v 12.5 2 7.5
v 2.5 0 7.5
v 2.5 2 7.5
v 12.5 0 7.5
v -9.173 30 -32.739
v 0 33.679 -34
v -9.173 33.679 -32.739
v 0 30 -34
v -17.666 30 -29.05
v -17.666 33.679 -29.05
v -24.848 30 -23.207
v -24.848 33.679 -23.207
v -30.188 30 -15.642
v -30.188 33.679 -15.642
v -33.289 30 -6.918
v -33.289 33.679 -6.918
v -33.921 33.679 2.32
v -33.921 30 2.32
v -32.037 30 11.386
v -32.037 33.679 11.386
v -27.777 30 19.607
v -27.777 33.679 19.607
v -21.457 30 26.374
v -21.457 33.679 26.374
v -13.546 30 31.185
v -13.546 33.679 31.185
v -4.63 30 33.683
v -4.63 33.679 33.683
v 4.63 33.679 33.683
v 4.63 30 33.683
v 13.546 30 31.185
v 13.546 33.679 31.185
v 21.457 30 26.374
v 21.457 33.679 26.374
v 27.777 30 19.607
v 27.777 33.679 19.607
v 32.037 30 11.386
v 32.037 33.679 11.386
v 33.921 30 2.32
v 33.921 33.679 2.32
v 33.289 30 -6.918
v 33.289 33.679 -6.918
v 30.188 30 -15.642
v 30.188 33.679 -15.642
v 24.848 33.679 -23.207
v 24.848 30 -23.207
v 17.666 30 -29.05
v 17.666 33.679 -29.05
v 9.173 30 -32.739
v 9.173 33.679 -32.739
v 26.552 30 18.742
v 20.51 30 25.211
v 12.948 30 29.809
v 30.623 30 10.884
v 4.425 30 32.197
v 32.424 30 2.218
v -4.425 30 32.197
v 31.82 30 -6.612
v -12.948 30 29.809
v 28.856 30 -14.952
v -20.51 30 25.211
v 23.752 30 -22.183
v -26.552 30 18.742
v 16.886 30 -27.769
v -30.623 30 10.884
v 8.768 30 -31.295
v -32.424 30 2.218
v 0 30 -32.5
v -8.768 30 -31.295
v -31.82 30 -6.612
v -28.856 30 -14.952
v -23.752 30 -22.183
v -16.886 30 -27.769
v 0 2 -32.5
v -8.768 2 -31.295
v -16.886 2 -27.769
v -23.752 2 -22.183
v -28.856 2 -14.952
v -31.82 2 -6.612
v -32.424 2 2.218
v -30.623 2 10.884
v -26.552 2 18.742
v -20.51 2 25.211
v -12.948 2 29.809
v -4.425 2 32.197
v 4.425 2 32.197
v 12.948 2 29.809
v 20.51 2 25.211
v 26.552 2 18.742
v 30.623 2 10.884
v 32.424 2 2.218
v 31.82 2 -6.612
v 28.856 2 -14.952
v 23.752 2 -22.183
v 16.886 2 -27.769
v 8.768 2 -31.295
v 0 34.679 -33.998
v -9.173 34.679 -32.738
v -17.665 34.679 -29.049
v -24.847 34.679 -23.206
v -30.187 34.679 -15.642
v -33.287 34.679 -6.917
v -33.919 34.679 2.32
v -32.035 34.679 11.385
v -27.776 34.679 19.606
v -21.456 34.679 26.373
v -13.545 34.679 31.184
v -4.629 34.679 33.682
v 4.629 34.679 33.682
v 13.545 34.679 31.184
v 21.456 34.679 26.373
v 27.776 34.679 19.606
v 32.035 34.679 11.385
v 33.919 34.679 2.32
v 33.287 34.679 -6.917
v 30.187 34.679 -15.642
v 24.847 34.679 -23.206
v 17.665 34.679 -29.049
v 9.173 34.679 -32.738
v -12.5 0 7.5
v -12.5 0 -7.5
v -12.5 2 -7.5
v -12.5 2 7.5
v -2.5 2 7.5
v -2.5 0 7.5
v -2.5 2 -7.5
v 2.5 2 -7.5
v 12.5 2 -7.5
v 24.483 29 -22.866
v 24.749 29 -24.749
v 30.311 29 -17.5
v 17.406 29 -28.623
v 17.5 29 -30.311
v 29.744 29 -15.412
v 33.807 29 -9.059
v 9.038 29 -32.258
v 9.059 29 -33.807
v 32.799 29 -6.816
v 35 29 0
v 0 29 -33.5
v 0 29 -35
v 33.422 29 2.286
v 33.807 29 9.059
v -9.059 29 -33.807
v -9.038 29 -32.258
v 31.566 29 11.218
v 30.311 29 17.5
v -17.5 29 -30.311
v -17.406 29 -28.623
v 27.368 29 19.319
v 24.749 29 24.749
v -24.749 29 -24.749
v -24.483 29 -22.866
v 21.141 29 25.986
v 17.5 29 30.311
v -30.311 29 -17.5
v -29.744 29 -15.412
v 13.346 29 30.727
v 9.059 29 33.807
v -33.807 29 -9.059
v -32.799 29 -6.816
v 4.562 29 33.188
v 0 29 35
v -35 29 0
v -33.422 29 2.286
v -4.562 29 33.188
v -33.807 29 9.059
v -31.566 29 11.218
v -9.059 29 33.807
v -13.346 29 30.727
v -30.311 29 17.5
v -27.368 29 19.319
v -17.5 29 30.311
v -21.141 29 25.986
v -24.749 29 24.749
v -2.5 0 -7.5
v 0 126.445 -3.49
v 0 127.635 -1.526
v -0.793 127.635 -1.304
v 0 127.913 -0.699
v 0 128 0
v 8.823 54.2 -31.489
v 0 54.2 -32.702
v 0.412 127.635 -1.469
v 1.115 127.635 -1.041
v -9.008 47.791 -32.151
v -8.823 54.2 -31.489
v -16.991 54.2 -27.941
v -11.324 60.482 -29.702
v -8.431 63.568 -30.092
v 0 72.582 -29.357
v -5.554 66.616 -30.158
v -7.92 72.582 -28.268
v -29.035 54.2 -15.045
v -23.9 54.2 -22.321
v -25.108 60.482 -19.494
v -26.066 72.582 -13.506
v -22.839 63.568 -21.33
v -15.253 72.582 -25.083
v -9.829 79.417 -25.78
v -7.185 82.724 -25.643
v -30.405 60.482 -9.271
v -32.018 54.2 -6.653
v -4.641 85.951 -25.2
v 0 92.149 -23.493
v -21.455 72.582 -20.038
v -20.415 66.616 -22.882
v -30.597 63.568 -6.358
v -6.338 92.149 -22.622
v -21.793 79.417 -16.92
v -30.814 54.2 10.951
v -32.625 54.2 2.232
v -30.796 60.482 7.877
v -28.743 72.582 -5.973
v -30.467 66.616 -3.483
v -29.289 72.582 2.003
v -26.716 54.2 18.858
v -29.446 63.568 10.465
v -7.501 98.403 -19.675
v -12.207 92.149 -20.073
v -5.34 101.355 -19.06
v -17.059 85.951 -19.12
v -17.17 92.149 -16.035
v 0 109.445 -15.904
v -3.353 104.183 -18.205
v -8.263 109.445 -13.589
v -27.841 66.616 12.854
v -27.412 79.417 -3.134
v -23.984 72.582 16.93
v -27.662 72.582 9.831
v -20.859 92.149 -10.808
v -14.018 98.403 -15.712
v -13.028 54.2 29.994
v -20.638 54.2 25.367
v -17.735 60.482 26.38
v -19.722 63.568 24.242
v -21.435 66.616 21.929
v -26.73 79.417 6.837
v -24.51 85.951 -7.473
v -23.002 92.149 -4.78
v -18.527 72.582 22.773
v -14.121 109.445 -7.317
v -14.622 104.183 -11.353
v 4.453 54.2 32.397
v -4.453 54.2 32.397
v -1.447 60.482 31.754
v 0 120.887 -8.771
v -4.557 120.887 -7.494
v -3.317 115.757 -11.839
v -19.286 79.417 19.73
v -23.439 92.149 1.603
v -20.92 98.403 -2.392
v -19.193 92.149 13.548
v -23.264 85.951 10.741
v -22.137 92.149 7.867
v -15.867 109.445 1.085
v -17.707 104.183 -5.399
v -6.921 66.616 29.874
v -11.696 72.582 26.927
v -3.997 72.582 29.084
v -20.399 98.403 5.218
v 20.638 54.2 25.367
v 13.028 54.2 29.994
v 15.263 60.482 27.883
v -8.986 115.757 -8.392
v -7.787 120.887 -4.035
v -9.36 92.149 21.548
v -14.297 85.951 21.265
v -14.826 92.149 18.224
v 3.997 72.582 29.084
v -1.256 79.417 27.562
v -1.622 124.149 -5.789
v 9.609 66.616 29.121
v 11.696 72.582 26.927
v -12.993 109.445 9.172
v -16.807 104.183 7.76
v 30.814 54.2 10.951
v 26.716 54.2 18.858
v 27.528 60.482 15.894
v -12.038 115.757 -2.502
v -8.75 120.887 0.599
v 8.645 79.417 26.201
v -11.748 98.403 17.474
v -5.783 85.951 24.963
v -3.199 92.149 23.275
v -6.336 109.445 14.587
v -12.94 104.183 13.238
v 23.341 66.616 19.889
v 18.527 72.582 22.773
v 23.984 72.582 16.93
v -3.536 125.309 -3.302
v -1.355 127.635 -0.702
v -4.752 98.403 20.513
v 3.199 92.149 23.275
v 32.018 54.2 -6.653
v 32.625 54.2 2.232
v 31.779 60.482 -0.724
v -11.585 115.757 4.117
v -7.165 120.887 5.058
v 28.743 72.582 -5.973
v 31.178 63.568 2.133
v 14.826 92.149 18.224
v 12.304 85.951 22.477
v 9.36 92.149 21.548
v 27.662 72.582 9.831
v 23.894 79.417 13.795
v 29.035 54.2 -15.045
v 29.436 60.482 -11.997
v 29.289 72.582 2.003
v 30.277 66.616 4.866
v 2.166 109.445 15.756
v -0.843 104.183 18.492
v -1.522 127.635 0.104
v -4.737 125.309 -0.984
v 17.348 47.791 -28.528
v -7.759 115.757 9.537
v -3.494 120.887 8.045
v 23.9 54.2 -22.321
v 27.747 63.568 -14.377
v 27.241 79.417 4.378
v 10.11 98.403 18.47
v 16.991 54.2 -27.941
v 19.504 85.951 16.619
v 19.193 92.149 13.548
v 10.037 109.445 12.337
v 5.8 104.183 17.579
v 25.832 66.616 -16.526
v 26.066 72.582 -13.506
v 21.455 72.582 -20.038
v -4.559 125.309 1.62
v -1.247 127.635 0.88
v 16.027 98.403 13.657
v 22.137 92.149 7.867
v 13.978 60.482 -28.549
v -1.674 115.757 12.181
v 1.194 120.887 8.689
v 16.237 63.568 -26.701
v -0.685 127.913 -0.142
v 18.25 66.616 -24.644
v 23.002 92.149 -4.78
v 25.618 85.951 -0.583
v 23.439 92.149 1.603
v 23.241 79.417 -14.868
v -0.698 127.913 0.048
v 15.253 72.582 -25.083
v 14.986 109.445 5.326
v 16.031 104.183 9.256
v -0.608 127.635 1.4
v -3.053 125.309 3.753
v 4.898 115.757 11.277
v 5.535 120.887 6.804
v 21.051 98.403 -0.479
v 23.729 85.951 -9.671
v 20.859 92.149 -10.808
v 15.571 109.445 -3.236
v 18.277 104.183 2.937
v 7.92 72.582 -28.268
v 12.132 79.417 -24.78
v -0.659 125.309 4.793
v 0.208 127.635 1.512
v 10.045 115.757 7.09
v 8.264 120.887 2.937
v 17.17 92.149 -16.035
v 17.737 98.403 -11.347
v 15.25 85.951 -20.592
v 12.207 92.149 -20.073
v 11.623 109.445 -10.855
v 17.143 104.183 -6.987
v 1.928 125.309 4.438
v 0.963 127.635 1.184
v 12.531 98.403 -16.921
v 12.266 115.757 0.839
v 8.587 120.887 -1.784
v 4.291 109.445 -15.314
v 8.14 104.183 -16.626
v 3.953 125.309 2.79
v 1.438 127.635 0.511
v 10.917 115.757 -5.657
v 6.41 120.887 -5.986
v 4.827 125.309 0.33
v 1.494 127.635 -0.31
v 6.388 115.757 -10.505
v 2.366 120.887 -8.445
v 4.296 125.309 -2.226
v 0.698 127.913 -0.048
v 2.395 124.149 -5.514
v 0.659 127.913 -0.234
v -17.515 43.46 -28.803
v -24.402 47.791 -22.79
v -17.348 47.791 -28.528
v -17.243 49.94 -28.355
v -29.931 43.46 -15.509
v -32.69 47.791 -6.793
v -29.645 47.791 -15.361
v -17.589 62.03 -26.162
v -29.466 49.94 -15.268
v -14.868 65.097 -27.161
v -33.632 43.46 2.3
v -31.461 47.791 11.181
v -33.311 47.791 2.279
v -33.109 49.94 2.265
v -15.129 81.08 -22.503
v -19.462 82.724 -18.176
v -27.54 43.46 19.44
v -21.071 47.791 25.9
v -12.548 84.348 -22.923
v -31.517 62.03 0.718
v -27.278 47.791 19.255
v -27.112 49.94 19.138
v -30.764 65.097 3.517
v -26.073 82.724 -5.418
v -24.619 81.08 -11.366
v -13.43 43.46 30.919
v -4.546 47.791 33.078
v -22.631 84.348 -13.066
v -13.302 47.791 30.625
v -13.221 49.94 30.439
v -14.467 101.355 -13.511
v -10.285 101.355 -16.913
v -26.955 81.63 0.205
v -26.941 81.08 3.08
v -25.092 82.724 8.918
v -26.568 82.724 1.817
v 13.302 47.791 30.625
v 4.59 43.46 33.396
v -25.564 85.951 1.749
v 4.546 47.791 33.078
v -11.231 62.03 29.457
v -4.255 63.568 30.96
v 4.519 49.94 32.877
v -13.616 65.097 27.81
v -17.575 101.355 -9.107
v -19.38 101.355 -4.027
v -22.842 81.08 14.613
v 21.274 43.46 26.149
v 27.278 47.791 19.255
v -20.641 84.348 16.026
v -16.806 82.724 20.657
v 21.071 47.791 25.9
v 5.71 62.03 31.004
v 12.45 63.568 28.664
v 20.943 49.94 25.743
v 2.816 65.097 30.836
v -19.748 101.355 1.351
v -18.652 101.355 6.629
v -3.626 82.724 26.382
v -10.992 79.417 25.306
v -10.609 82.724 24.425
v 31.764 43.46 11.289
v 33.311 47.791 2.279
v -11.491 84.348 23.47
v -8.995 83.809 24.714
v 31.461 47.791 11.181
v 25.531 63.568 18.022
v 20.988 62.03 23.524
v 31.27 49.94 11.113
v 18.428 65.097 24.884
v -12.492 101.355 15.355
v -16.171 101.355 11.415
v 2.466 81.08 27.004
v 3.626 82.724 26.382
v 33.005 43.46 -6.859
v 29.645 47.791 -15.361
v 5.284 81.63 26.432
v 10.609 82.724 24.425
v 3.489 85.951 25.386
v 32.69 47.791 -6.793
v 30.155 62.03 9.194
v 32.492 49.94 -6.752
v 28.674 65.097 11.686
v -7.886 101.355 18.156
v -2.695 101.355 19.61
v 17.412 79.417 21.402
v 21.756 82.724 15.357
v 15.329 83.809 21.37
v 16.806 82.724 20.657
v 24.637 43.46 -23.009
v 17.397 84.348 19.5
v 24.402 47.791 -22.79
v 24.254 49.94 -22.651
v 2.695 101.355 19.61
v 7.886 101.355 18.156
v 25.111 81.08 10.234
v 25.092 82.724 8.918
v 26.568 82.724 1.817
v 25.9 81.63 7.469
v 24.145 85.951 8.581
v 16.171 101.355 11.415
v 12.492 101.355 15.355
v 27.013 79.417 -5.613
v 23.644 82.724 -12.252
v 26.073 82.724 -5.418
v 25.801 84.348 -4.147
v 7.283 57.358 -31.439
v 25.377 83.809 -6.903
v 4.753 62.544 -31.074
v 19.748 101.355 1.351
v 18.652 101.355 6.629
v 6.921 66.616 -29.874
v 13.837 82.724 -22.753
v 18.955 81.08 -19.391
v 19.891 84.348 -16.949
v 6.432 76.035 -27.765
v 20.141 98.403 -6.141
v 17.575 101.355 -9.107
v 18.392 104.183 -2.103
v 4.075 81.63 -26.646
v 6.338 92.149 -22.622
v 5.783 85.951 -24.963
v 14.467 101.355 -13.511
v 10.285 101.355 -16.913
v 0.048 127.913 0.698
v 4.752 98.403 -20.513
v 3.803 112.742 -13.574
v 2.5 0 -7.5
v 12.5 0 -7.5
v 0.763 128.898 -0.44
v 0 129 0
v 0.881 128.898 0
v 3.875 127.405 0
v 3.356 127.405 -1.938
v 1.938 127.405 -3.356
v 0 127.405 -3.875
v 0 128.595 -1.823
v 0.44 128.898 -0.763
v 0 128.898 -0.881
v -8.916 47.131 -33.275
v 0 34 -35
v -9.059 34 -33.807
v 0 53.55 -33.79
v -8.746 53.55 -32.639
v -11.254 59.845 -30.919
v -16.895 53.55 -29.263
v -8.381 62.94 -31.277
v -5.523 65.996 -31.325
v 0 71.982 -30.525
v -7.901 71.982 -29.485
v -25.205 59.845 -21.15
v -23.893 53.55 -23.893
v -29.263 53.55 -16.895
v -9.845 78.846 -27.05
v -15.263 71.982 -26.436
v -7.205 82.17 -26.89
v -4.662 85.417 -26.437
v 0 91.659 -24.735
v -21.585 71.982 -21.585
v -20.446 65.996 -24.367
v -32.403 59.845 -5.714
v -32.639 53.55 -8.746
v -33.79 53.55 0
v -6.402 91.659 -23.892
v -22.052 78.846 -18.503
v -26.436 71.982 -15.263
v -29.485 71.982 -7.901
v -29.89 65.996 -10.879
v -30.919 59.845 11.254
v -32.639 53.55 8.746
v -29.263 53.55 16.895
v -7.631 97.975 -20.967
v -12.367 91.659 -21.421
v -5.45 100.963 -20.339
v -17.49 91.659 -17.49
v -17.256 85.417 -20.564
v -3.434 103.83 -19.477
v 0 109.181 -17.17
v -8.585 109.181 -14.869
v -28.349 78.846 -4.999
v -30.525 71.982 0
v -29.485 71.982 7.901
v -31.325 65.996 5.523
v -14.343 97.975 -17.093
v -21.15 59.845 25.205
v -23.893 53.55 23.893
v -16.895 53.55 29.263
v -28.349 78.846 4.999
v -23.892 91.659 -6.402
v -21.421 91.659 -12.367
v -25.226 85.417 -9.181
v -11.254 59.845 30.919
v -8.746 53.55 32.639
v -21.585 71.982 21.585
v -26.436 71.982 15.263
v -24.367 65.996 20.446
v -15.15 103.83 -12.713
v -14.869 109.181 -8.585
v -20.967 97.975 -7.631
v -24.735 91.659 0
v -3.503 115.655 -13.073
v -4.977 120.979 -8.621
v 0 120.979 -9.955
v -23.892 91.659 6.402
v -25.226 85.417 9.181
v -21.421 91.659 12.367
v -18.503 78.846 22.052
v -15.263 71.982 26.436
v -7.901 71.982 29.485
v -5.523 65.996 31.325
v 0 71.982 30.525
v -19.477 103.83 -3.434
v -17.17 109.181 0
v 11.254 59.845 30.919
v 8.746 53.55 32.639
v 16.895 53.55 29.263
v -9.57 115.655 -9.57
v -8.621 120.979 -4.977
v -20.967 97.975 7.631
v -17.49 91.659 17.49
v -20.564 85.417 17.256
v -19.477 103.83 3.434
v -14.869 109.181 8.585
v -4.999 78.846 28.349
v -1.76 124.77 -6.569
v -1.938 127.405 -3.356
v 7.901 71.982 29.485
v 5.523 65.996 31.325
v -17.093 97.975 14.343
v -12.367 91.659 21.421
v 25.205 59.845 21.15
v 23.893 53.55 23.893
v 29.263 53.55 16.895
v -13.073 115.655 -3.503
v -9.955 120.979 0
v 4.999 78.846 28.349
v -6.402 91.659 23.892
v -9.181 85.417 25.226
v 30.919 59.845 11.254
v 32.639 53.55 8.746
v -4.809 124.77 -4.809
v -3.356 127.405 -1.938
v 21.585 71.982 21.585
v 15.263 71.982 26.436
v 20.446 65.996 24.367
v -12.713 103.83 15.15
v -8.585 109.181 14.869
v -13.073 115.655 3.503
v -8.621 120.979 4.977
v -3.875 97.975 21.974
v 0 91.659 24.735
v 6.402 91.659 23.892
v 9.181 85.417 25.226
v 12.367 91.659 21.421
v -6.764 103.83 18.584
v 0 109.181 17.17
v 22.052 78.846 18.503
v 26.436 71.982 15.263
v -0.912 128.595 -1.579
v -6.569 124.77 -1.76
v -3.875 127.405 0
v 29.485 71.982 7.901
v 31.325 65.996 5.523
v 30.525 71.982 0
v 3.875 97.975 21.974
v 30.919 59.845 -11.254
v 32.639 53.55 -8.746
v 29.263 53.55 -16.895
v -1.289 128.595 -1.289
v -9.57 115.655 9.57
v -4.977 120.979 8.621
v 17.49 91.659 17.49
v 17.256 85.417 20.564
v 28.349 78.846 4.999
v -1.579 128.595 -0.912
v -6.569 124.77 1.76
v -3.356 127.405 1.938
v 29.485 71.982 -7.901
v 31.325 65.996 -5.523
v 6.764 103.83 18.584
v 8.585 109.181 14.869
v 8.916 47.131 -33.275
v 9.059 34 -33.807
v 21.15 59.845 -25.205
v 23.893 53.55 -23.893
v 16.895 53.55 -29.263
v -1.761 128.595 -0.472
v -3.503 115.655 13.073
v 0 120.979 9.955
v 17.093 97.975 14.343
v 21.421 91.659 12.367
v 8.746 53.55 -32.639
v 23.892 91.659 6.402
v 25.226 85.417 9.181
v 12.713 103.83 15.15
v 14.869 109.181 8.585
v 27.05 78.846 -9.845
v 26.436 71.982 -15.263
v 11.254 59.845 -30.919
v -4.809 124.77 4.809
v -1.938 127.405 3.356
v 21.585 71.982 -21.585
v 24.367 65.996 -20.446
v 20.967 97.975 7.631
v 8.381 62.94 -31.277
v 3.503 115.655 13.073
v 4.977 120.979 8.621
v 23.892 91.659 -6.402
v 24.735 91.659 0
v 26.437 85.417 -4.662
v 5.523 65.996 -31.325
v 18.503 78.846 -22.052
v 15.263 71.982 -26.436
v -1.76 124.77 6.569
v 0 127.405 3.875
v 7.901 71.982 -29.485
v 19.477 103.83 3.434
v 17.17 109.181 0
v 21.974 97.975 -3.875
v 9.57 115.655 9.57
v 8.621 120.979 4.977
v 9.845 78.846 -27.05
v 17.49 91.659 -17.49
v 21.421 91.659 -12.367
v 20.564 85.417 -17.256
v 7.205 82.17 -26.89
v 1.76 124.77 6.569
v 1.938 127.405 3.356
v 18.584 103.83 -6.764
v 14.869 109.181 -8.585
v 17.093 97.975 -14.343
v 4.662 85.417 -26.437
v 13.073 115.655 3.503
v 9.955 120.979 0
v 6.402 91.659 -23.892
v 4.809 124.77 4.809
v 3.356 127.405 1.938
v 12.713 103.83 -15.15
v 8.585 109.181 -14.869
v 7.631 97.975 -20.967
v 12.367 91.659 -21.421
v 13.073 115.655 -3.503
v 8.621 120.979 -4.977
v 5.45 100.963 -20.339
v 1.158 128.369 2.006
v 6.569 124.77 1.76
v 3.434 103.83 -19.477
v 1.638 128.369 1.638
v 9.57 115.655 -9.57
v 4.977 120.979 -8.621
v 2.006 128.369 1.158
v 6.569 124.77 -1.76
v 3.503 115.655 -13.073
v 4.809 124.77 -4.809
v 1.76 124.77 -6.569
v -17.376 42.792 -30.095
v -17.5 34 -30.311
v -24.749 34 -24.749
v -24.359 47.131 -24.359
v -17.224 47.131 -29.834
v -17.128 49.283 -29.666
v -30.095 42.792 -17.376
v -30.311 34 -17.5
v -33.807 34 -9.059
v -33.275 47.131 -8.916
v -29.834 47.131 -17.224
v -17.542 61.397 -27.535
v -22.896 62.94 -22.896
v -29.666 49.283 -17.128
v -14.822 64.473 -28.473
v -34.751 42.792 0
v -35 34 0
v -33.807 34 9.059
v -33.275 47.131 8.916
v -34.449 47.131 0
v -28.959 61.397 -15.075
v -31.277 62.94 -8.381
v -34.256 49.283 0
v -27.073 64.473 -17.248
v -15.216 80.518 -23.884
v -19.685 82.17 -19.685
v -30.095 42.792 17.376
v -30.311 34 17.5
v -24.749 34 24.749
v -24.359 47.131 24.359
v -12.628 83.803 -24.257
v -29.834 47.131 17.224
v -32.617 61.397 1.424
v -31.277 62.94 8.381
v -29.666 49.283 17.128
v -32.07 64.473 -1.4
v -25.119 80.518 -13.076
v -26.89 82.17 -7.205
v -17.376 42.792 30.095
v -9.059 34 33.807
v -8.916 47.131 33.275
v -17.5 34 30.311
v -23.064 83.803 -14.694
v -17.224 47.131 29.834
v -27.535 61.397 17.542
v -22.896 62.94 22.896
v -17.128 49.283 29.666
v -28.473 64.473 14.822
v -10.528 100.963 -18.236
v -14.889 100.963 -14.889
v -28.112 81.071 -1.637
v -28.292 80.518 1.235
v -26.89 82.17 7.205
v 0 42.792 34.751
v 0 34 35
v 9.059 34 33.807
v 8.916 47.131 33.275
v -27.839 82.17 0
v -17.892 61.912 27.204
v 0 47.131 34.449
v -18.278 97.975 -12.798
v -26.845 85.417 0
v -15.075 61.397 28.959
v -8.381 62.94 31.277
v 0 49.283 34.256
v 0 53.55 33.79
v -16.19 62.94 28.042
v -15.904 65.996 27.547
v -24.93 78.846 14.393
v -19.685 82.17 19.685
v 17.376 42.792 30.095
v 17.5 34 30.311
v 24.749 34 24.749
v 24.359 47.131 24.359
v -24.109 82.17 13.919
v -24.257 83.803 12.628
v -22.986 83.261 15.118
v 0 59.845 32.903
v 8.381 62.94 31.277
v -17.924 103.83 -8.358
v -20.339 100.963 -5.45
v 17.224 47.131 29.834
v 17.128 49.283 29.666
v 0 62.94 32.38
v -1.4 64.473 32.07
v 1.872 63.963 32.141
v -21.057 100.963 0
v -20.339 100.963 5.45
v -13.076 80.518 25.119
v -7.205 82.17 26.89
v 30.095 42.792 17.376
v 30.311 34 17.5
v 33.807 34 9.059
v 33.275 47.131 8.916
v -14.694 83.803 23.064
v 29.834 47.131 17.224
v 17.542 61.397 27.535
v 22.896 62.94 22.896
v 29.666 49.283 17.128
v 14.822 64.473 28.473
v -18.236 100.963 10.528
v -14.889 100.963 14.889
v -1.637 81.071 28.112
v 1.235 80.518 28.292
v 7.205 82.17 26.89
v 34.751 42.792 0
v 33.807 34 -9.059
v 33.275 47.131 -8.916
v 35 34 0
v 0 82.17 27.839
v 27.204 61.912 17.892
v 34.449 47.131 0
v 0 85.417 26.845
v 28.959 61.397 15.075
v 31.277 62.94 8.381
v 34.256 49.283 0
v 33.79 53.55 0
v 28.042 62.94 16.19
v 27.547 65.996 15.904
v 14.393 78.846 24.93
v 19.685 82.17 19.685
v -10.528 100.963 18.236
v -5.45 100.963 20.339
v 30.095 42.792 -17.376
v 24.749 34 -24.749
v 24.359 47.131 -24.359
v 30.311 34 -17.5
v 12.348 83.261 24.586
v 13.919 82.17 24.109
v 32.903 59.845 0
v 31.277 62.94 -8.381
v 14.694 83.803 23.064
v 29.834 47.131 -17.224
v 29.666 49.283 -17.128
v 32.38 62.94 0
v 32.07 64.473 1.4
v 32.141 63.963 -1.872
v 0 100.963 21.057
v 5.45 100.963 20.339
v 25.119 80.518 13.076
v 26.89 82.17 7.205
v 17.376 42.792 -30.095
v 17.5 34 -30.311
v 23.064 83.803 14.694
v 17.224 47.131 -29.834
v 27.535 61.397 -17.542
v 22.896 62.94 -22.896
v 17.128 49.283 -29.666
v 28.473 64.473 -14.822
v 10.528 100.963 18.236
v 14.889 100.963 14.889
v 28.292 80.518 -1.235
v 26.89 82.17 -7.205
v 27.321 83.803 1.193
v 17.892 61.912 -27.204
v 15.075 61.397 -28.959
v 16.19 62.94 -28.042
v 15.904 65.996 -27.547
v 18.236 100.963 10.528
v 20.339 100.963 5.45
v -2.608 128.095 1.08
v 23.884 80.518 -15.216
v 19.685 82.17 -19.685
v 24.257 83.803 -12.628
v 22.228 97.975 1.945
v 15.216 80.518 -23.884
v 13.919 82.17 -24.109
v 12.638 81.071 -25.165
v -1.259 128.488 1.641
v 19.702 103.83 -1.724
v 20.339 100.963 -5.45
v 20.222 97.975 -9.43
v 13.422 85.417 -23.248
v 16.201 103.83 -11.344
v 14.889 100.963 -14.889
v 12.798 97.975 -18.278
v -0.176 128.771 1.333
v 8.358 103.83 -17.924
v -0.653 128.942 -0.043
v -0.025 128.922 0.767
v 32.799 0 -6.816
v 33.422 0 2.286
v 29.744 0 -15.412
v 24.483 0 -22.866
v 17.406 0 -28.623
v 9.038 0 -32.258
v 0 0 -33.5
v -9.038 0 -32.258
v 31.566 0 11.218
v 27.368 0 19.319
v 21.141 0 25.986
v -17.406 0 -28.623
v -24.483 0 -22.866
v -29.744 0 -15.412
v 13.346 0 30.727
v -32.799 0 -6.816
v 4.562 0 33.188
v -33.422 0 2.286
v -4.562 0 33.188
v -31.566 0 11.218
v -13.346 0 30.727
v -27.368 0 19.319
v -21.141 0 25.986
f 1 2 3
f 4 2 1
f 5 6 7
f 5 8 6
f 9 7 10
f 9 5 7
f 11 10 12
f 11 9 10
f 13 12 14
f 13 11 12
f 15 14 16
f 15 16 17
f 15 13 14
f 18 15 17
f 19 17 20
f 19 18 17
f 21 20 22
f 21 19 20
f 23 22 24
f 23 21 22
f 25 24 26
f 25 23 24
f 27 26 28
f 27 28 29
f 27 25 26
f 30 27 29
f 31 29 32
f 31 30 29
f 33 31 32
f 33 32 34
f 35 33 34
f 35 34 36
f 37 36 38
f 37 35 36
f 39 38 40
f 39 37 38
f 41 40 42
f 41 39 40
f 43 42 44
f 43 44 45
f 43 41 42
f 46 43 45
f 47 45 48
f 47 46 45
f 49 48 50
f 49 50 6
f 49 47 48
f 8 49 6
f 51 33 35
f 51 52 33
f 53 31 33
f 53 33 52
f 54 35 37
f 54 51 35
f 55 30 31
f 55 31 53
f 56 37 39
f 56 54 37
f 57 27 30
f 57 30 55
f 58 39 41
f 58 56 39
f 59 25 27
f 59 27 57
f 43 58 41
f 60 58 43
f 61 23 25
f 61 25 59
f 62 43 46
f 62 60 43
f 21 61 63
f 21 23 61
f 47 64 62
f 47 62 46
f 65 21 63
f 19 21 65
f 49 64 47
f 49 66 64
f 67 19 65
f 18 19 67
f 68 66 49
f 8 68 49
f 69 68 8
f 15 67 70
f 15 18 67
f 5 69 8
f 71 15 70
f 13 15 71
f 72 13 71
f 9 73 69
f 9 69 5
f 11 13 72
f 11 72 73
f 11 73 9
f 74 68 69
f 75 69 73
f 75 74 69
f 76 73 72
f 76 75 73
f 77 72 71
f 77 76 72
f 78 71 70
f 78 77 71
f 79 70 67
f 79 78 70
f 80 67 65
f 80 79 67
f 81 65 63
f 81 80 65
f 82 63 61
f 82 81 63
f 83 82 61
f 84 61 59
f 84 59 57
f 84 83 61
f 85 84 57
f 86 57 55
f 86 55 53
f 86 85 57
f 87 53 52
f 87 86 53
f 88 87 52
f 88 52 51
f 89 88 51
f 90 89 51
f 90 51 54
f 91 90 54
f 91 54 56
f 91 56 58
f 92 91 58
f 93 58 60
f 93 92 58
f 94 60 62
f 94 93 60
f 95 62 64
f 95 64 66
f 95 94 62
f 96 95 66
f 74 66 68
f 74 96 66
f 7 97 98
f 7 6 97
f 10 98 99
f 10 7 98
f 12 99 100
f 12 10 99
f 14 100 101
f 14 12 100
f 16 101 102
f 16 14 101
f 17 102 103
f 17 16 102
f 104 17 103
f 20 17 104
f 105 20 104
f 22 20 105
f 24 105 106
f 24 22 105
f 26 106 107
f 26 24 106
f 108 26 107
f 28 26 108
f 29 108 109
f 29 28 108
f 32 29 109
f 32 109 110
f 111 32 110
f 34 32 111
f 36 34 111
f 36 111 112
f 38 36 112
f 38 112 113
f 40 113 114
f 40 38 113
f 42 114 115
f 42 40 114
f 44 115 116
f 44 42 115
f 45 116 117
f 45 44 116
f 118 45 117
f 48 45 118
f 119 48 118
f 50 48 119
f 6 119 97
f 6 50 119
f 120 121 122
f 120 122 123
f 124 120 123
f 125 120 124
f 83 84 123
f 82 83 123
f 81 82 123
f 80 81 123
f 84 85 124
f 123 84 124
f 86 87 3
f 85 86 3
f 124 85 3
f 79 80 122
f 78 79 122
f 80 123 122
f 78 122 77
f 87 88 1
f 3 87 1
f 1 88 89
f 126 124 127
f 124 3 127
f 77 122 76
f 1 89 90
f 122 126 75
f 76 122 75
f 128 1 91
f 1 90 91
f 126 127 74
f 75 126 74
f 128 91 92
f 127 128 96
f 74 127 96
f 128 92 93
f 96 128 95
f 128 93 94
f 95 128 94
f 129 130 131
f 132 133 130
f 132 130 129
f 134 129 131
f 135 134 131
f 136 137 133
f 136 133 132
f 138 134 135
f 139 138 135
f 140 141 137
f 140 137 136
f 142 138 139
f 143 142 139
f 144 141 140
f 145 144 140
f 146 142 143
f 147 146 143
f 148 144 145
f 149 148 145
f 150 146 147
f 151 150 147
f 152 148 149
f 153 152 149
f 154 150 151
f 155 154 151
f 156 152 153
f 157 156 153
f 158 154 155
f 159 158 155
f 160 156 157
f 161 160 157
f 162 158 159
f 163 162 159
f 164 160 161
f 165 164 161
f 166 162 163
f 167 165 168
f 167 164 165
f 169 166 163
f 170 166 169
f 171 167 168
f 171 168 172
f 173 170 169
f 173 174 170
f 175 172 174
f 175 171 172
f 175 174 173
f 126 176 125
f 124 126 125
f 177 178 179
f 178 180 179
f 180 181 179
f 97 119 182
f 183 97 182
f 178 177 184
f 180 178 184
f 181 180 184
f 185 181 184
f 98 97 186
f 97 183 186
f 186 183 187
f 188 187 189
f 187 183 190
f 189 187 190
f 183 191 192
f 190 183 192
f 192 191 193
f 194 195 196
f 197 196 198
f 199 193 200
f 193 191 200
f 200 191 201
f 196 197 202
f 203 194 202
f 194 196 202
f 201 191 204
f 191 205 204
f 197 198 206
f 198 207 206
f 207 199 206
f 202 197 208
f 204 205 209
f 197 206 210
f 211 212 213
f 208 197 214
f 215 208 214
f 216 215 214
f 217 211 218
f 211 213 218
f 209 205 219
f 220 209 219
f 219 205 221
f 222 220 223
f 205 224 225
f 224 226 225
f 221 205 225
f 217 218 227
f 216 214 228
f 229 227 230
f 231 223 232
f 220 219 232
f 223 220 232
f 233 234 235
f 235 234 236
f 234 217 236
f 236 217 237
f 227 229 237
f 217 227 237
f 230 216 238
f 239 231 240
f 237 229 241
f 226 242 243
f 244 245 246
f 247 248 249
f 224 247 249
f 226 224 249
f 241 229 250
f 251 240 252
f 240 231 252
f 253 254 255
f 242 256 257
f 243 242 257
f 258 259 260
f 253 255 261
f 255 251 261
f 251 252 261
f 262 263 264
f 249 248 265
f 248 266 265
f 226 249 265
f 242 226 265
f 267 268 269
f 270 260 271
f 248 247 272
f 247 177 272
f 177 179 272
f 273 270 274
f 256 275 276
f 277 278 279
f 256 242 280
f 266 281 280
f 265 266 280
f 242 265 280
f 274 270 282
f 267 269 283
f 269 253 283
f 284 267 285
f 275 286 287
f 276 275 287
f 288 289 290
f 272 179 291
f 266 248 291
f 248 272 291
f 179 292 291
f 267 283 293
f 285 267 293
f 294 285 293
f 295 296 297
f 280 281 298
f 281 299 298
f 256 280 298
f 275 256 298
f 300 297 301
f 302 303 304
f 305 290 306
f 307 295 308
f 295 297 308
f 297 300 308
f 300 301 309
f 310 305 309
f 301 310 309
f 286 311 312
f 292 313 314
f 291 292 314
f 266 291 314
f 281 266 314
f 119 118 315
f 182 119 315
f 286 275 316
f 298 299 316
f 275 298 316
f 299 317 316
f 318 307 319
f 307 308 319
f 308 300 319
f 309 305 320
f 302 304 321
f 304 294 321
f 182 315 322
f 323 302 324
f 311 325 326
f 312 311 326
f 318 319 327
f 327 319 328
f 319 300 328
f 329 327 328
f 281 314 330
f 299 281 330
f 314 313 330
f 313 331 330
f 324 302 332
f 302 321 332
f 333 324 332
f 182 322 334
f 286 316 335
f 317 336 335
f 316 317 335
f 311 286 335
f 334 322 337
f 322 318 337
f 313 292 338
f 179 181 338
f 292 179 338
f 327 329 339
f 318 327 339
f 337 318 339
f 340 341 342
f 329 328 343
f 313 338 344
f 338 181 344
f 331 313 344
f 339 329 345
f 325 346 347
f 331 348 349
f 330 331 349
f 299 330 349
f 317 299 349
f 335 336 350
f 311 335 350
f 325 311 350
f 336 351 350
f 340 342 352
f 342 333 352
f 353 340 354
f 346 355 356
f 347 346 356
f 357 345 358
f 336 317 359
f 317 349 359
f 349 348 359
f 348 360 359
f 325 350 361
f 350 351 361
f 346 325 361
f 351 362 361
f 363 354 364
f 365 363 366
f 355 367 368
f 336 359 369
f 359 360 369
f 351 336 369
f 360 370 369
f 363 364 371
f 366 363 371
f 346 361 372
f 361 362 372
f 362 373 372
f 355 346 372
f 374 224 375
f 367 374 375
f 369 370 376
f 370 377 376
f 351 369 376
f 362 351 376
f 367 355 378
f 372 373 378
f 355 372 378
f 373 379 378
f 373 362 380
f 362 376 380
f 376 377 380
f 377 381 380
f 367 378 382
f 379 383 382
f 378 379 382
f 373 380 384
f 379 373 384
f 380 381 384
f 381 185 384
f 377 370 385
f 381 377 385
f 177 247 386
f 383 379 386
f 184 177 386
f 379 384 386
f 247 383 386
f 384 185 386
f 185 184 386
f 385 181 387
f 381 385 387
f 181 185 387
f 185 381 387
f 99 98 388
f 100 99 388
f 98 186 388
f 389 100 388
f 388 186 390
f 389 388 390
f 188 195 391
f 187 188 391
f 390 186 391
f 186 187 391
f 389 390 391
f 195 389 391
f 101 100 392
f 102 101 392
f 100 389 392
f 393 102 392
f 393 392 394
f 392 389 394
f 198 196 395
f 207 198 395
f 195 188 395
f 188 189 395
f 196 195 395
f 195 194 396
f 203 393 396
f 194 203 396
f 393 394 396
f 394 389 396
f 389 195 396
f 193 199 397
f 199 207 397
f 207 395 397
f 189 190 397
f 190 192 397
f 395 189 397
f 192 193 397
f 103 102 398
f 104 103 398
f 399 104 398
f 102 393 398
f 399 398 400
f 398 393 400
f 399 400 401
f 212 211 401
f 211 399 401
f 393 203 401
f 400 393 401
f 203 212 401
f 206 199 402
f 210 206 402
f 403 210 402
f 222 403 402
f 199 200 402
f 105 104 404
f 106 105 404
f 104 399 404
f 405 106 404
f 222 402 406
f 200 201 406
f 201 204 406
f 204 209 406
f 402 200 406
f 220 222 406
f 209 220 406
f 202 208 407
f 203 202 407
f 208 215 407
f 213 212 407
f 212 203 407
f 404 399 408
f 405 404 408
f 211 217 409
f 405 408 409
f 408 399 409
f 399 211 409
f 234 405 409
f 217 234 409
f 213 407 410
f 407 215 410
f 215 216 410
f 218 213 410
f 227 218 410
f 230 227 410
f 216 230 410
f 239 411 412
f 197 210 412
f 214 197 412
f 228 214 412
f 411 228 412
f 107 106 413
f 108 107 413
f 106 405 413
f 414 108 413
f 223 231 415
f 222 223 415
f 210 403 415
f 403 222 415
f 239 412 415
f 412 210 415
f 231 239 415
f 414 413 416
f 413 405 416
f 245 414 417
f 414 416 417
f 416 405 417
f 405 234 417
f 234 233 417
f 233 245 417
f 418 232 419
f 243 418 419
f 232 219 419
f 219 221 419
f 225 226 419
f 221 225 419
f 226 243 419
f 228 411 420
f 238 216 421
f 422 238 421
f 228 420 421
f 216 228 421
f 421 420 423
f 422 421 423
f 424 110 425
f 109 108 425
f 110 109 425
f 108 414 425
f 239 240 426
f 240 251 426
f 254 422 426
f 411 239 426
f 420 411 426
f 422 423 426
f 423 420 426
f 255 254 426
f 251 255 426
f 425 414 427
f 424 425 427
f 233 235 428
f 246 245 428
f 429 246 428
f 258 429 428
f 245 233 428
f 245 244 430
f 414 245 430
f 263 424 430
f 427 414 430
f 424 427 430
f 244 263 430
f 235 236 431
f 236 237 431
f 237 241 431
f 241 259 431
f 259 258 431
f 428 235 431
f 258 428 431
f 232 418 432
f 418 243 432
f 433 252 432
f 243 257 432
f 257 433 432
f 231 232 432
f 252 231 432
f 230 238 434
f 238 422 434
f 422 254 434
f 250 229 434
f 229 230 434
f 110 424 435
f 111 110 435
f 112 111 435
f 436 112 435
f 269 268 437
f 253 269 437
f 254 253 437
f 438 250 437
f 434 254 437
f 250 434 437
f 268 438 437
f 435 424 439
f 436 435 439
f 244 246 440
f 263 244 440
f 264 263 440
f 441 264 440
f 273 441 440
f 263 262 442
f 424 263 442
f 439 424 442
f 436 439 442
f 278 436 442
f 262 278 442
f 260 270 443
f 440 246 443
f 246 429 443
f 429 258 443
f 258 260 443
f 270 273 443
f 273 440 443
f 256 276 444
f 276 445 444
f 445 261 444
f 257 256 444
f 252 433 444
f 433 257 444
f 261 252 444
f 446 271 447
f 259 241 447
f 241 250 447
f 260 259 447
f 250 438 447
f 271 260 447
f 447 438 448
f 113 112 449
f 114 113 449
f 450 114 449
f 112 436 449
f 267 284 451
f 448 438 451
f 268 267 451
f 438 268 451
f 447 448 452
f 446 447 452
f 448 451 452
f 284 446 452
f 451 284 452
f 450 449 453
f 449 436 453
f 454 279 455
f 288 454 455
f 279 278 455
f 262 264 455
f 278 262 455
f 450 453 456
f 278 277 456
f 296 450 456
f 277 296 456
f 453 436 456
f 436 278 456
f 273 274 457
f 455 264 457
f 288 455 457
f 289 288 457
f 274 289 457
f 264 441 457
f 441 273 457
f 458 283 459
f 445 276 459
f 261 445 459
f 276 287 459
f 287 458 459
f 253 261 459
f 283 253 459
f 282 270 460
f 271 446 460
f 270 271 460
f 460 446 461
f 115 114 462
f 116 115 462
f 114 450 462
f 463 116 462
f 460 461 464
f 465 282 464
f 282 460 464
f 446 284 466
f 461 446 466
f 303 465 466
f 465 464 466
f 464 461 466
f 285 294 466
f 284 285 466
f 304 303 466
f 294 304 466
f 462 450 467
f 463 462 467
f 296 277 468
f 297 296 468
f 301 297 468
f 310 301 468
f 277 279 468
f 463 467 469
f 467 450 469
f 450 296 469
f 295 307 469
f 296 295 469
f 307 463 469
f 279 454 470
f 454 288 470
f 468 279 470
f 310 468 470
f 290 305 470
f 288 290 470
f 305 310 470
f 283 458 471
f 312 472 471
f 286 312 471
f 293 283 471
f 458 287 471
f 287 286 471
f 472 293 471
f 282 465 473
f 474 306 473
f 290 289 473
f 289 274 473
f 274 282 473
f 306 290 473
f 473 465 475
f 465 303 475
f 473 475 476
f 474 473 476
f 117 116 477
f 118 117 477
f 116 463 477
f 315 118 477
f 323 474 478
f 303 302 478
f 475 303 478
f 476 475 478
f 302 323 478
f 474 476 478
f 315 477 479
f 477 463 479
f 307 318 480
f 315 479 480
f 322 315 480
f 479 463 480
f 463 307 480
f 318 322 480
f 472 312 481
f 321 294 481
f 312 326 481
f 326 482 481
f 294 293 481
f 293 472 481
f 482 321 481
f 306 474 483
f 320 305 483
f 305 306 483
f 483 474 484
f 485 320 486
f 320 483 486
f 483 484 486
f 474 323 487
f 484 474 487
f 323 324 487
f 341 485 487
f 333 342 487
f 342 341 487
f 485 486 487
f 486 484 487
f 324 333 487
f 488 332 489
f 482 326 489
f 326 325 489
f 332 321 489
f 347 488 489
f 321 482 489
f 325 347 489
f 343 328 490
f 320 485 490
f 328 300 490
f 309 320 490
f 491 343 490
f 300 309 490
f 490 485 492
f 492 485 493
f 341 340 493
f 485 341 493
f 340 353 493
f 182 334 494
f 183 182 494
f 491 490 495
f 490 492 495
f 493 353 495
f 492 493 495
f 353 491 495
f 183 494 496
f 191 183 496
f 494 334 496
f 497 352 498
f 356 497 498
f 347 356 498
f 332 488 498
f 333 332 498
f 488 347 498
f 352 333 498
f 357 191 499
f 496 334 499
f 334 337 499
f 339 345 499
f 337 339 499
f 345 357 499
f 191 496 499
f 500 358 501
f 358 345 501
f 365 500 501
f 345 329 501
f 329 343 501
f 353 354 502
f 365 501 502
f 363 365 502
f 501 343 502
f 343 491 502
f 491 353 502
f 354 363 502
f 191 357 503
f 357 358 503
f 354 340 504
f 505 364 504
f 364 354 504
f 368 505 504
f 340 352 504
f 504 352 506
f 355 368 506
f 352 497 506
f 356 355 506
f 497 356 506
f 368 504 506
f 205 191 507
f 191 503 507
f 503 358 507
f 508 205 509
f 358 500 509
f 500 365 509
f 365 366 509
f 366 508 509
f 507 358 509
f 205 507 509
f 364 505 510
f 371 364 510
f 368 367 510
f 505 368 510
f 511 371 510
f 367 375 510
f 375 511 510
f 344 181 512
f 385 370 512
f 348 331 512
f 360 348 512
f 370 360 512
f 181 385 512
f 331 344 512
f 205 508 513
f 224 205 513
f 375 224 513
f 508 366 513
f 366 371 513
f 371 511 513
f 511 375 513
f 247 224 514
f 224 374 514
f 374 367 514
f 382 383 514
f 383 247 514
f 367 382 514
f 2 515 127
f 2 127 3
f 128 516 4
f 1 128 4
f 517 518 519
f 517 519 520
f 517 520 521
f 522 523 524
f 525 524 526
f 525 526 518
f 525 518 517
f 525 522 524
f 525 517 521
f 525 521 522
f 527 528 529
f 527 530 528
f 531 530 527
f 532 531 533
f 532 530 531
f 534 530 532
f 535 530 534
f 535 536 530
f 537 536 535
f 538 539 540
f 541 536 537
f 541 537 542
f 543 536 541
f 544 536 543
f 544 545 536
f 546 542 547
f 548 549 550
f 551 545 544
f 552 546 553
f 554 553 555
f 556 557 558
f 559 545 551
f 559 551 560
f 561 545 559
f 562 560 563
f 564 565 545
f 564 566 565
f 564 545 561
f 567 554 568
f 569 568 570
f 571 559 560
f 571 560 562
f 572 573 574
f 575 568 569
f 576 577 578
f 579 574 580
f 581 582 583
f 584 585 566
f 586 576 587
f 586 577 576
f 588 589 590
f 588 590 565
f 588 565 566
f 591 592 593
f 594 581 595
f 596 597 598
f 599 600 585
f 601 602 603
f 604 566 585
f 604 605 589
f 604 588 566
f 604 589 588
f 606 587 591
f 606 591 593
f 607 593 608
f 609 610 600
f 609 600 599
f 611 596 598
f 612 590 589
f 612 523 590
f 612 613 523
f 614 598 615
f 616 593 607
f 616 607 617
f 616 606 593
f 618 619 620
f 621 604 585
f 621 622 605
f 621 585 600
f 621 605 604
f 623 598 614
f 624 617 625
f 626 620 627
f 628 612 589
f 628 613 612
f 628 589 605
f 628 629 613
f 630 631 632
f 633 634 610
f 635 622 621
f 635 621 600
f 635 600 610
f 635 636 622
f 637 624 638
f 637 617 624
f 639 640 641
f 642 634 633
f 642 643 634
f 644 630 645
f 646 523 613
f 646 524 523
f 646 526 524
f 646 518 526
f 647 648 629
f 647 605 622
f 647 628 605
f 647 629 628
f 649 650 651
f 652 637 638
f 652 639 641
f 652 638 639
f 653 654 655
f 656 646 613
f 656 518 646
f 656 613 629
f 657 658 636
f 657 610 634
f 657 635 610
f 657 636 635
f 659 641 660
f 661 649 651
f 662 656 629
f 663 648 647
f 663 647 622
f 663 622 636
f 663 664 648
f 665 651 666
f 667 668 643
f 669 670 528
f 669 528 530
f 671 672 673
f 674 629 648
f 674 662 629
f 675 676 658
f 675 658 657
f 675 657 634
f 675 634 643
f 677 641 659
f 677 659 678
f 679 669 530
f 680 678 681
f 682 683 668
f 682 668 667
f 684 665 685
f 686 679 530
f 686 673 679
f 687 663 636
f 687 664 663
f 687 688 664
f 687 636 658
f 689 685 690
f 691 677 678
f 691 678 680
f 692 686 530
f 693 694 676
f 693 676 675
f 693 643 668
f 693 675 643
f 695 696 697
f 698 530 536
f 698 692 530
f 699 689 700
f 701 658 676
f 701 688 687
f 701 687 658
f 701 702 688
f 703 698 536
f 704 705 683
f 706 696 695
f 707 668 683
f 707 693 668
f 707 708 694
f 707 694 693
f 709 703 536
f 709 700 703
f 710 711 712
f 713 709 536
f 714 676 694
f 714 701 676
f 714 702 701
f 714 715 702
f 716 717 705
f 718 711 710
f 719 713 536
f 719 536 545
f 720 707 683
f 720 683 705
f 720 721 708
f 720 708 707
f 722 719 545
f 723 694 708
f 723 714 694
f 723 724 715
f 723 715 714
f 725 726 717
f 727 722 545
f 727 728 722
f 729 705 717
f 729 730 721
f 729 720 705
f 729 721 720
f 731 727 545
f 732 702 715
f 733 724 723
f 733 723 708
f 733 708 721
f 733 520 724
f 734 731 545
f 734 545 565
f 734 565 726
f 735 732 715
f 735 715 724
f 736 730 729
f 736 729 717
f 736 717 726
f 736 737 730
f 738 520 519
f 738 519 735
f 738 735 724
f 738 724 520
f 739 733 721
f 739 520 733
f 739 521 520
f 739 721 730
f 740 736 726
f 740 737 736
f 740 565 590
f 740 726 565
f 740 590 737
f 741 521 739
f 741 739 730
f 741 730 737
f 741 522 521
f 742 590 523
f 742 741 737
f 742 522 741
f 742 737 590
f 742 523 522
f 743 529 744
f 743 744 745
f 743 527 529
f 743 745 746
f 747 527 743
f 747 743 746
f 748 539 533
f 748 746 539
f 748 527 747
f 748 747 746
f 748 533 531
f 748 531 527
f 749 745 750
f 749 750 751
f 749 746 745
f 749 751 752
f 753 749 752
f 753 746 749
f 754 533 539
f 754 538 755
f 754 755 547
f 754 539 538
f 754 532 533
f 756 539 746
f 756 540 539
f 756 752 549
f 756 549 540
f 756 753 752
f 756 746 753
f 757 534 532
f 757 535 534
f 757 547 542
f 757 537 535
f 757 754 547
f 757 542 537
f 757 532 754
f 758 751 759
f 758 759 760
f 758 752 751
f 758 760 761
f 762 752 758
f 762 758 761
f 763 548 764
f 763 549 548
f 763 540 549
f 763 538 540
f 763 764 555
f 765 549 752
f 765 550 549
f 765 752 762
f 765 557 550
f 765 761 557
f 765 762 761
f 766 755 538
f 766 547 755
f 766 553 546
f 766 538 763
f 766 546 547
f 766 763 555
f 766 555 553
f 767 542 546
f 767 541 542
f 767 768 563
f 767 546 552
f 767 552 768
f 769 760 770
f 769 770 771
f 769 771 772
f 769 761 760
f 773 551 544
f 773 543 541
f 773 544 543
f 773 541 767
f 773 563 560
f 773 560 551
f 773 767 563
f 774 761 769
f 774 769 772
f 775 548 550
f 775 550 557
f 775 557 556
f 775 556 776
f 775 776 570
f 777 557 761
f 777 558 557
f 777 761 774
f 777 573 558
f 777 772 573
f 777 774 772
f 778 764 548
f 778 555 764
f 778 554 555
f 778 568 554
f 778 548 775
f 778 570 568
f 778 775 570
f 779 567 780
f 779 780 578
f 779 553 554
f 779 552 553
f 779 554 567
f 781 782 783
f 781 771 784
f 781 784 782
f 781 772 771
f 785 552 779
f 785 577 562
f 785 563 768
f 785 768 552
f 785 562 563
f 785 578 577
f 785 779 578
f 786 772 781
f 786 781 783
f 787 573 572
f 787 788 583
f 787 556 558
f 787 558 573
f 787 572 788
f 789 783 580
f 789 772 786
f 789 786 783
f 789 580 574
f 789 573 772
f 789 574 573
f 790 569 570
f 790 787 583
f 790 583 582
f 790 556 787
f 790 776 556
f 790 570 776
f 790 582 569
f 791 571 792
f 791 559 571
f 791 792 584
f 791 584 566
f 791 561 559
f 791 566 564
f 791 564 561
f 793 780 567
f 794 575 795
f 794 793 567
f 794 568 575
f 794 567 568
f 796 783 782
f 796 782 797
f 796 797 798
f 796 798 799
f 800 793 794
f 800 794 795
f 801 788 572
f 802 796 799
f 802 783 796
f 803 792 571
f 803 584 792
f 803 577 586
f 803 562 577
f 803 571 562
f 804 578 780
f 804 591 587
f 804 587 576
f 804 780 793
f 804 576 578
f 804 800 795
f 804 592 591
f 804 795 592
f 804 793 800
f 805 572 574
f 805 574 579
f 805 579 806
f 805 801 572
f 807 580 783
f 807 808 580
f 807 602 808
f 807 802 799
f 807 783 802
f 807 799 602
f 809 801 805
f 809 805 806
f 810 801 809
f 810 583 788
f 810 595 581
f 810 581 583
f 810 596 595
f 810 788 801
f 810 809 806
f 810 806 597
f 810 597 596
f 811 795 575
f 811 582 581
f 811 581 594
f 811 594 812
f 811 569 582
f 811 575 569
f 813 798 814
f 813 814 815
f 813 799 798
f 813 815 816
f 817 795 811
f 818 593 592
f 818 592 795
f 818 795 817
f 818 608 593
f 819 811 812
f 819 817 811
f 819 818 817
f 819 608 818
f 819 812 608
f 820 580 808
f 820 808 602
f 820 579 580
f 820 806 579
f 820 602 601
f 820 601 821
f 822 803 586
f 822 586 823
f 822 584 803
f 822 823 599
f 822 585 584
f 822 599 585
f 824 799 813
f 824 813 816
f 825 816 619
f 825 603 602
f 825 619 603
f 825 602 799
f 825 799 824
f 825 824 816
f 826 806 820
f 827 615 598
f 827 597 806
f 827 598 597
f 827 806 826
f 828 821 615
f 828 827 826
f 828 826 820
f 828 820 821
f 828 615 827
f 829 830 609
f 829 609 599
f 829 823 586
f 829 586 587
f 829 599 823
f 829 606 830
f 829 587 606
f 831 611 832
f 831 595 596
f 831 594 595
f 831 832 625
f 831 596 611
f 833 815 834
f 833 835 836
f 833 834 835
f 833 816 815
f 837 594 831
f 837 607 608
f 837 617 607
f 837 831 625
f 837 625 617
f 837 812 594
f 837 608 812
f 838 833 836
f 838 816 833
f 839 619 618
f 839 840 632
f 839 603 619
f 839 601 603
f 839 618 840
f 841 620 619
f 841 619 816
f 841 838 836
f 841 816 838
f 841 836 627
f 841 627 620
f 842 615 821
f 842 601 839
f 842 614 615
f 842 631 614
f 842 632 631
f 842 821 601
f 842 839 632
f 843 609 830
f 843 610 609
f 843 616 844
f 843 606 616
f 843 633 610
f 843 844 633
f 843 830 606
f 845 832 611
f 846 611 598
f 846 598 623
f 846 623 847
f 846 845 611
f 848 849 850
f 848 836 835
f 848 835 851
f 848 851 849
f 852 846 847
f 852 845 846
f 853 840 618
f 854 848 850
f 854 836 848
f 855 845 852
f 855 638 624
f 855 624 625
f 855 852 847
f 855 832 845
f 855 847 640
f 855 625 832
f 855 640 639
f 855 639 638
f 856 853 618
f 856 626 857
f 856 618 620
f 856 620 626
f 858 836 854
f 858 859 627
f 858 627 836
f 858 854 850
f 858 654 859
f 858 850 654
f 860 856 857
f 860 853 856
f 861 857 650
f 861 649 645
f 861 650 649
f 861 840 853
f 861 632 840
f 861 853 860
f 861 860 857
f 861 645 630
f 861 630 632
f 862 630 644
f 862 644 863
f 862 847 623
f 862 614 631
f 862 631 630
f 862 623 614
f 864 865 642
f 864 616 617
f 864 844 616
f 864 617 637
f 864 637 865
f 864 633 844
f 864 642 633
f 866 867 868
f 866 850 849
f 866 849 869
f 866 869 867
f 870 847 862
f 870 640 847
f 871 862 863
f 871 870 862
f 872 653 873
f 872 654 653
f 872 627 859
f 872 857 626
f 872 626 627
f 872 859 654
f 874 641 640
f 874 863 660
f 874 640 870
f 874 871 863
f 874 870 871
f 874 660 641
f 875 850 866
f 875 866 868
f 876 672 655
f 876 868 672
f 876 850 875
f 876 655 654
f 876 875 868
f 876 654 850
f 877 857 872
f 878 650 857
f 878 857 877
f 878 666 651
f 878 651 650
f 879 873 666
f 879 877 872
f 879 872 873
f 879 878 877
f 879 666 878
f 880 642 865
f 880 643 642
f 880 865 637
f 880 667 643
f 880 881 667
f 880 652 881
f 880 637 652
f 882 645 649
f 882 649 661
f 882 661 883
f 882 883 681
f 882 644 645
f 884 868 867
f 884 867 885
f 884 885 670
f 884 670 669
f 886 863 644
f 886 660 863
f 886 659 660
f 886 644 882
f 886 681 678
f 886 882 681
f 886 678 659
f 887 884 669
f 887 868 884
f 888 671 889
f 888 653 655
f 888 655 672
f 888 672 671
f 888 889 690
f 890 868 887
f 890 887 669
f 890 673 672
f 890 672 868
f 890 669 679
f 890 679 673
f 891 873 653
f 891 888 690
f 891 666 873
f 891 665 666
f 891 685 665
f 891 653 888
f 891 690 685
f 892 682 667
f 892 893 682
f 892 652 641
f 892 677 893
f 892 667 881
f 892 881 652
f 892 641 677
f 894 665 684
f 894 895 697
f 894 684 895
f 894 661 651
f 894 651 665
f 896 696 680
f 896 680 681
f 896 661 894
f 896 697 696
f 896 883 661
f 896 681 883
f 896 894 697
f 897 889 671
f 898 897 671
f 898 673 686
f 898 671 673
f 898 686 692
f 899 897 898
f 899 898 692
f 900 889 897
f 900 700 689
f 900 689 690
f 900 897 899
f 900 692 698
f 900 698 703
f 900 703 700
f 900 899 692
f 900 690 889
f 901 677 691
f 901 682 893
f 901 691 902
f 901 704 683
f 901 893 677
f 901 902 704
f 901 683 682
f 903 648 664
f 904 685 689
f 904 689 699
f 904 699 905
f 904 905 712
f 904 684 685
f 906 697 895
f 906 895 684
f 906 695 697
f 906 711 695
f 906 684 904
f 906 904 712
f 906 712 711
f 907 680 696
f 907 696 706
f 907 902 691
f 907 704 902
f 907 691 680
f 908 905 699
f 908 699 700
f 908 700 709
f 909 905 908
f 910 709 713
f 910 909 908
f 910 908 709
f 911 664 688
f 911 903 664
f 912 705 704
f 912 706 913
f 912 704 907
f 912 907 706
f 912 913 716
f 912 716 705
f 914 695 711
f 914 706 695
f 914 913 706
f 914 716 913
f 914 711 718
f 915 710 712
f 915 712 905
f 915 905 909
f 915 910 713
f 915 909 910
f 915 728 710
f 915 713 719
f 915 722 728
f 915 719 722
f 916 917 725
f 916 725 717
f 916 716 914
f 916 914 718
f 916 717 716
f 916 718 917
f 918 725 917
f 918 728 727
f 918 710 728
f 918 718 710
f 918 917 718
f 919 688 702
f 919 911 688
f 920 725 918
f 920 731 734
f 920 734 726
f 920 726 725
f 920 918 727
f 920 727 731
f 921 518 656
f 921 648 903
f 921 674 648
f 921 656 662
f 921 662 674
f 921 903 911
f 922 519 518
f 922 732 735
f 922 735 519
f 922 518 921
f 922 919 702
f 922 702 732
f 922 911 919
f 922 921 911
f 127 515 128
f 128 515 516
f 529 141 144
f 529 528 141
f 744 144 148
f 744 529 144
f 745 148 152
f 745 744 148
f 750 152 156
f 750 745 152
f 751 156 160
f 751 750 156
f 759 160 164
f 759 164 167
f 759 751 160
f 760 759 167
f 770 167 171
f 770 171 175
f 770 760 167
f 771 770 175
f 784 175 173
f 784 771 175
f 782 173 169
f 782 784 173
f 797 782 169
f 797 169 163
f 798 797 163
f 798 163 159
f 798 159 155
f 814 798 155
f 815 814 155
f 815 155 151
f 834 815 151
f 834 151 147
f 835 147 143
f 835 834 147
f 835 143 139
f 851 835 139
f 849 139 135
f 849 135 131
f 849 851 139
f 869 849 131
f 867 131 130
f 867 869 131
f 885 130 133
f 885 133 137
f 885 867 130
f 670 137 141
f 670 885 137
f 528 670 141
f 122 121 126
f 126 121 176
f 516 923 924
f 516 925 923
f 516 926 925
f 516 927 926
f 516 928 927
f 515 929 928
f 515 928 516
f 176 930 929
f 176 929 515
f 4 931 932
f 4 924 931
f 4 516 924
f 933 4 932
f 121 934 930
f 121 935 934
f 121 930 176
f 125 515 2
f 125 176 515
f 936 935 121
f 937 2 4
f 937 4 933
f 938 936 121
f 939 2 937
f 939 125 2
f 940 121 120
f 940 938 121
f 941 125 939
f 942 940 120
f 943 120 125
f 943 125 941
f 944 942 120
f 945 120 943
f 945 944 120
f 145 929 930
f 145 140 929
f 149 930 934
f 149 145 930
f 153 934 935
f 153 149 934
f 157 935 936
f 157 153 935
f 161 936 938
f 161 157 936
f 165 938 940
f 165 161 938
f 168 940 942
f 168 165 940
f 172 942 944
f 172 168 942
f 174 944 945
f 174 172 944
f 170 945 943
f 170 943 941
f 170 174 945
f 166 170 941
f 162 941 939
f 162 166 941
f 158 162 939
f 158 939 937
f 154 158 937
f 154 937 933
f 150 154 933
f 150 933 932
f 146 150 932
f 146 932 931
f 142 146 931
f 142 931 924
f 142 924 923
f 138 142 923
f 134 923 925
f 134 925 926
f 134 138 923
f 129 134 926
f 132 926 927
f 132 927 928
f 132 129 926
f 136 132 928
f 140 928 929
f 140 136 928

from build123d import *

# Parameters (mm, degrees)
BOSS_EXTRUDE1_START = -2
SKETCH2_R           = 33.5
BOSS_EXTRUDE1_DEPTH = 2
SKETCH3_W           = 10
SKETCH3_H           = 15
CUT_EXTRUDE1_DEPTH  = 2


with BuildPart() as part:
    # Sketch1 → Revolve1 (revolve)
    with BuildSketch(Plane.XY, mode=Mode.PRIVATE) as revolve1_sk:
        with BuildLine():
            Line((-33.5, 0), (-33.5, 29))
            Line((-33.5, 29), (-35, 29))
            Line((-35, 29), (-35, 34))
            add(Edge.make_bspline(
                [(-35, 34), (-35, 84.230477341), (-10.204077545, 129), (0, 129)],
                knots=[0, 0, 0, 0, 1, 1, 1, 1], degree=3))
            Line((0, 129), (0, 128))
            add(Edge.make_bspline(
                [(-33.998483451, 34.678650605), (-33.991581263, 36.224092512), (-33.93035746, 39.323038638), (-33.628011861, 45.449717858), (-32.930147658, 52.999936547), (-31.637237127, 61.816356904), (-29.381428766, 73.174794828), (-25.705936414, 86.483124789), (-20.381782509, 100.569855924), (-15.566274854, 110.353659681), (-11.721562917, 116.772432581), (-8.903323702, 120.821784375), (-6.216251644, 124.044106905), (-4.149084944, 125.985259834), (-2.652724981, 127.059465204), (-1.628060193, 127.620483156), (-0.879863894, 127.88514238), (-0.348657385, 127.984548618), (-0.119526866, 128), (0, 128)],
                knots=[0.004535476, 0.004535476, 0.004535476, 0.004535476, 0.035643742, 0.066752009, 0.128968542, 0.191185074, 0.253401607, 0.377834673, 0.502267738, 0.626700804, 0.688917336, 0.751133869, 0.813350402, 0.875566935, 0.906675201, 0.937783467, 0.968891734, 0.984445867, 1, 1, 1, 1], degree=3))
            Line((-33.998483451, 34.678650605), (-34, 33.678651755))
            Line((-34, 33.678651755), (-34, 30))
            Line((-34, 30), (-32.5, 30))
            Line((-32.5, 30), (-32.5, 0))
            Line((-32.5, 0), (-33.5, 0))
        make_face()
    revolve(revolve1_sk.sketch.rotate(Axis((0, 0, 0), (0, 1, 0)), 270), axis=Axis((0, 0, 0), (0, 1, 0)))

    # Sketch2 → Boss-Extrude1 (add)
    with BuildSketch(Plane.XZ.offset(BOSS_EXTRUDE1_START)):
        with Locations(Location((0, 0, 0), (0, 0, 270))):
            Circle(SKETCH2_R)
    extrude(amount=BOSS_EXTRUDE1_DEPTH)

    # Sketch3 → Cut-Extrude1 (cut)
    with BuildSketch(Plane.XZ):
        with Locations((7.5, 0)):
            Rectangle(SKETCH3_W, SKETCH3_H)
        with Locations((-7.5, 0)):
            Rectangle(SKETCH3_W, SKETCH3_H)
    extrude(amount=-CUT_EXTRUDE1_DEPTH, mode=Mode.SUBTRACT)


solid = part.part
